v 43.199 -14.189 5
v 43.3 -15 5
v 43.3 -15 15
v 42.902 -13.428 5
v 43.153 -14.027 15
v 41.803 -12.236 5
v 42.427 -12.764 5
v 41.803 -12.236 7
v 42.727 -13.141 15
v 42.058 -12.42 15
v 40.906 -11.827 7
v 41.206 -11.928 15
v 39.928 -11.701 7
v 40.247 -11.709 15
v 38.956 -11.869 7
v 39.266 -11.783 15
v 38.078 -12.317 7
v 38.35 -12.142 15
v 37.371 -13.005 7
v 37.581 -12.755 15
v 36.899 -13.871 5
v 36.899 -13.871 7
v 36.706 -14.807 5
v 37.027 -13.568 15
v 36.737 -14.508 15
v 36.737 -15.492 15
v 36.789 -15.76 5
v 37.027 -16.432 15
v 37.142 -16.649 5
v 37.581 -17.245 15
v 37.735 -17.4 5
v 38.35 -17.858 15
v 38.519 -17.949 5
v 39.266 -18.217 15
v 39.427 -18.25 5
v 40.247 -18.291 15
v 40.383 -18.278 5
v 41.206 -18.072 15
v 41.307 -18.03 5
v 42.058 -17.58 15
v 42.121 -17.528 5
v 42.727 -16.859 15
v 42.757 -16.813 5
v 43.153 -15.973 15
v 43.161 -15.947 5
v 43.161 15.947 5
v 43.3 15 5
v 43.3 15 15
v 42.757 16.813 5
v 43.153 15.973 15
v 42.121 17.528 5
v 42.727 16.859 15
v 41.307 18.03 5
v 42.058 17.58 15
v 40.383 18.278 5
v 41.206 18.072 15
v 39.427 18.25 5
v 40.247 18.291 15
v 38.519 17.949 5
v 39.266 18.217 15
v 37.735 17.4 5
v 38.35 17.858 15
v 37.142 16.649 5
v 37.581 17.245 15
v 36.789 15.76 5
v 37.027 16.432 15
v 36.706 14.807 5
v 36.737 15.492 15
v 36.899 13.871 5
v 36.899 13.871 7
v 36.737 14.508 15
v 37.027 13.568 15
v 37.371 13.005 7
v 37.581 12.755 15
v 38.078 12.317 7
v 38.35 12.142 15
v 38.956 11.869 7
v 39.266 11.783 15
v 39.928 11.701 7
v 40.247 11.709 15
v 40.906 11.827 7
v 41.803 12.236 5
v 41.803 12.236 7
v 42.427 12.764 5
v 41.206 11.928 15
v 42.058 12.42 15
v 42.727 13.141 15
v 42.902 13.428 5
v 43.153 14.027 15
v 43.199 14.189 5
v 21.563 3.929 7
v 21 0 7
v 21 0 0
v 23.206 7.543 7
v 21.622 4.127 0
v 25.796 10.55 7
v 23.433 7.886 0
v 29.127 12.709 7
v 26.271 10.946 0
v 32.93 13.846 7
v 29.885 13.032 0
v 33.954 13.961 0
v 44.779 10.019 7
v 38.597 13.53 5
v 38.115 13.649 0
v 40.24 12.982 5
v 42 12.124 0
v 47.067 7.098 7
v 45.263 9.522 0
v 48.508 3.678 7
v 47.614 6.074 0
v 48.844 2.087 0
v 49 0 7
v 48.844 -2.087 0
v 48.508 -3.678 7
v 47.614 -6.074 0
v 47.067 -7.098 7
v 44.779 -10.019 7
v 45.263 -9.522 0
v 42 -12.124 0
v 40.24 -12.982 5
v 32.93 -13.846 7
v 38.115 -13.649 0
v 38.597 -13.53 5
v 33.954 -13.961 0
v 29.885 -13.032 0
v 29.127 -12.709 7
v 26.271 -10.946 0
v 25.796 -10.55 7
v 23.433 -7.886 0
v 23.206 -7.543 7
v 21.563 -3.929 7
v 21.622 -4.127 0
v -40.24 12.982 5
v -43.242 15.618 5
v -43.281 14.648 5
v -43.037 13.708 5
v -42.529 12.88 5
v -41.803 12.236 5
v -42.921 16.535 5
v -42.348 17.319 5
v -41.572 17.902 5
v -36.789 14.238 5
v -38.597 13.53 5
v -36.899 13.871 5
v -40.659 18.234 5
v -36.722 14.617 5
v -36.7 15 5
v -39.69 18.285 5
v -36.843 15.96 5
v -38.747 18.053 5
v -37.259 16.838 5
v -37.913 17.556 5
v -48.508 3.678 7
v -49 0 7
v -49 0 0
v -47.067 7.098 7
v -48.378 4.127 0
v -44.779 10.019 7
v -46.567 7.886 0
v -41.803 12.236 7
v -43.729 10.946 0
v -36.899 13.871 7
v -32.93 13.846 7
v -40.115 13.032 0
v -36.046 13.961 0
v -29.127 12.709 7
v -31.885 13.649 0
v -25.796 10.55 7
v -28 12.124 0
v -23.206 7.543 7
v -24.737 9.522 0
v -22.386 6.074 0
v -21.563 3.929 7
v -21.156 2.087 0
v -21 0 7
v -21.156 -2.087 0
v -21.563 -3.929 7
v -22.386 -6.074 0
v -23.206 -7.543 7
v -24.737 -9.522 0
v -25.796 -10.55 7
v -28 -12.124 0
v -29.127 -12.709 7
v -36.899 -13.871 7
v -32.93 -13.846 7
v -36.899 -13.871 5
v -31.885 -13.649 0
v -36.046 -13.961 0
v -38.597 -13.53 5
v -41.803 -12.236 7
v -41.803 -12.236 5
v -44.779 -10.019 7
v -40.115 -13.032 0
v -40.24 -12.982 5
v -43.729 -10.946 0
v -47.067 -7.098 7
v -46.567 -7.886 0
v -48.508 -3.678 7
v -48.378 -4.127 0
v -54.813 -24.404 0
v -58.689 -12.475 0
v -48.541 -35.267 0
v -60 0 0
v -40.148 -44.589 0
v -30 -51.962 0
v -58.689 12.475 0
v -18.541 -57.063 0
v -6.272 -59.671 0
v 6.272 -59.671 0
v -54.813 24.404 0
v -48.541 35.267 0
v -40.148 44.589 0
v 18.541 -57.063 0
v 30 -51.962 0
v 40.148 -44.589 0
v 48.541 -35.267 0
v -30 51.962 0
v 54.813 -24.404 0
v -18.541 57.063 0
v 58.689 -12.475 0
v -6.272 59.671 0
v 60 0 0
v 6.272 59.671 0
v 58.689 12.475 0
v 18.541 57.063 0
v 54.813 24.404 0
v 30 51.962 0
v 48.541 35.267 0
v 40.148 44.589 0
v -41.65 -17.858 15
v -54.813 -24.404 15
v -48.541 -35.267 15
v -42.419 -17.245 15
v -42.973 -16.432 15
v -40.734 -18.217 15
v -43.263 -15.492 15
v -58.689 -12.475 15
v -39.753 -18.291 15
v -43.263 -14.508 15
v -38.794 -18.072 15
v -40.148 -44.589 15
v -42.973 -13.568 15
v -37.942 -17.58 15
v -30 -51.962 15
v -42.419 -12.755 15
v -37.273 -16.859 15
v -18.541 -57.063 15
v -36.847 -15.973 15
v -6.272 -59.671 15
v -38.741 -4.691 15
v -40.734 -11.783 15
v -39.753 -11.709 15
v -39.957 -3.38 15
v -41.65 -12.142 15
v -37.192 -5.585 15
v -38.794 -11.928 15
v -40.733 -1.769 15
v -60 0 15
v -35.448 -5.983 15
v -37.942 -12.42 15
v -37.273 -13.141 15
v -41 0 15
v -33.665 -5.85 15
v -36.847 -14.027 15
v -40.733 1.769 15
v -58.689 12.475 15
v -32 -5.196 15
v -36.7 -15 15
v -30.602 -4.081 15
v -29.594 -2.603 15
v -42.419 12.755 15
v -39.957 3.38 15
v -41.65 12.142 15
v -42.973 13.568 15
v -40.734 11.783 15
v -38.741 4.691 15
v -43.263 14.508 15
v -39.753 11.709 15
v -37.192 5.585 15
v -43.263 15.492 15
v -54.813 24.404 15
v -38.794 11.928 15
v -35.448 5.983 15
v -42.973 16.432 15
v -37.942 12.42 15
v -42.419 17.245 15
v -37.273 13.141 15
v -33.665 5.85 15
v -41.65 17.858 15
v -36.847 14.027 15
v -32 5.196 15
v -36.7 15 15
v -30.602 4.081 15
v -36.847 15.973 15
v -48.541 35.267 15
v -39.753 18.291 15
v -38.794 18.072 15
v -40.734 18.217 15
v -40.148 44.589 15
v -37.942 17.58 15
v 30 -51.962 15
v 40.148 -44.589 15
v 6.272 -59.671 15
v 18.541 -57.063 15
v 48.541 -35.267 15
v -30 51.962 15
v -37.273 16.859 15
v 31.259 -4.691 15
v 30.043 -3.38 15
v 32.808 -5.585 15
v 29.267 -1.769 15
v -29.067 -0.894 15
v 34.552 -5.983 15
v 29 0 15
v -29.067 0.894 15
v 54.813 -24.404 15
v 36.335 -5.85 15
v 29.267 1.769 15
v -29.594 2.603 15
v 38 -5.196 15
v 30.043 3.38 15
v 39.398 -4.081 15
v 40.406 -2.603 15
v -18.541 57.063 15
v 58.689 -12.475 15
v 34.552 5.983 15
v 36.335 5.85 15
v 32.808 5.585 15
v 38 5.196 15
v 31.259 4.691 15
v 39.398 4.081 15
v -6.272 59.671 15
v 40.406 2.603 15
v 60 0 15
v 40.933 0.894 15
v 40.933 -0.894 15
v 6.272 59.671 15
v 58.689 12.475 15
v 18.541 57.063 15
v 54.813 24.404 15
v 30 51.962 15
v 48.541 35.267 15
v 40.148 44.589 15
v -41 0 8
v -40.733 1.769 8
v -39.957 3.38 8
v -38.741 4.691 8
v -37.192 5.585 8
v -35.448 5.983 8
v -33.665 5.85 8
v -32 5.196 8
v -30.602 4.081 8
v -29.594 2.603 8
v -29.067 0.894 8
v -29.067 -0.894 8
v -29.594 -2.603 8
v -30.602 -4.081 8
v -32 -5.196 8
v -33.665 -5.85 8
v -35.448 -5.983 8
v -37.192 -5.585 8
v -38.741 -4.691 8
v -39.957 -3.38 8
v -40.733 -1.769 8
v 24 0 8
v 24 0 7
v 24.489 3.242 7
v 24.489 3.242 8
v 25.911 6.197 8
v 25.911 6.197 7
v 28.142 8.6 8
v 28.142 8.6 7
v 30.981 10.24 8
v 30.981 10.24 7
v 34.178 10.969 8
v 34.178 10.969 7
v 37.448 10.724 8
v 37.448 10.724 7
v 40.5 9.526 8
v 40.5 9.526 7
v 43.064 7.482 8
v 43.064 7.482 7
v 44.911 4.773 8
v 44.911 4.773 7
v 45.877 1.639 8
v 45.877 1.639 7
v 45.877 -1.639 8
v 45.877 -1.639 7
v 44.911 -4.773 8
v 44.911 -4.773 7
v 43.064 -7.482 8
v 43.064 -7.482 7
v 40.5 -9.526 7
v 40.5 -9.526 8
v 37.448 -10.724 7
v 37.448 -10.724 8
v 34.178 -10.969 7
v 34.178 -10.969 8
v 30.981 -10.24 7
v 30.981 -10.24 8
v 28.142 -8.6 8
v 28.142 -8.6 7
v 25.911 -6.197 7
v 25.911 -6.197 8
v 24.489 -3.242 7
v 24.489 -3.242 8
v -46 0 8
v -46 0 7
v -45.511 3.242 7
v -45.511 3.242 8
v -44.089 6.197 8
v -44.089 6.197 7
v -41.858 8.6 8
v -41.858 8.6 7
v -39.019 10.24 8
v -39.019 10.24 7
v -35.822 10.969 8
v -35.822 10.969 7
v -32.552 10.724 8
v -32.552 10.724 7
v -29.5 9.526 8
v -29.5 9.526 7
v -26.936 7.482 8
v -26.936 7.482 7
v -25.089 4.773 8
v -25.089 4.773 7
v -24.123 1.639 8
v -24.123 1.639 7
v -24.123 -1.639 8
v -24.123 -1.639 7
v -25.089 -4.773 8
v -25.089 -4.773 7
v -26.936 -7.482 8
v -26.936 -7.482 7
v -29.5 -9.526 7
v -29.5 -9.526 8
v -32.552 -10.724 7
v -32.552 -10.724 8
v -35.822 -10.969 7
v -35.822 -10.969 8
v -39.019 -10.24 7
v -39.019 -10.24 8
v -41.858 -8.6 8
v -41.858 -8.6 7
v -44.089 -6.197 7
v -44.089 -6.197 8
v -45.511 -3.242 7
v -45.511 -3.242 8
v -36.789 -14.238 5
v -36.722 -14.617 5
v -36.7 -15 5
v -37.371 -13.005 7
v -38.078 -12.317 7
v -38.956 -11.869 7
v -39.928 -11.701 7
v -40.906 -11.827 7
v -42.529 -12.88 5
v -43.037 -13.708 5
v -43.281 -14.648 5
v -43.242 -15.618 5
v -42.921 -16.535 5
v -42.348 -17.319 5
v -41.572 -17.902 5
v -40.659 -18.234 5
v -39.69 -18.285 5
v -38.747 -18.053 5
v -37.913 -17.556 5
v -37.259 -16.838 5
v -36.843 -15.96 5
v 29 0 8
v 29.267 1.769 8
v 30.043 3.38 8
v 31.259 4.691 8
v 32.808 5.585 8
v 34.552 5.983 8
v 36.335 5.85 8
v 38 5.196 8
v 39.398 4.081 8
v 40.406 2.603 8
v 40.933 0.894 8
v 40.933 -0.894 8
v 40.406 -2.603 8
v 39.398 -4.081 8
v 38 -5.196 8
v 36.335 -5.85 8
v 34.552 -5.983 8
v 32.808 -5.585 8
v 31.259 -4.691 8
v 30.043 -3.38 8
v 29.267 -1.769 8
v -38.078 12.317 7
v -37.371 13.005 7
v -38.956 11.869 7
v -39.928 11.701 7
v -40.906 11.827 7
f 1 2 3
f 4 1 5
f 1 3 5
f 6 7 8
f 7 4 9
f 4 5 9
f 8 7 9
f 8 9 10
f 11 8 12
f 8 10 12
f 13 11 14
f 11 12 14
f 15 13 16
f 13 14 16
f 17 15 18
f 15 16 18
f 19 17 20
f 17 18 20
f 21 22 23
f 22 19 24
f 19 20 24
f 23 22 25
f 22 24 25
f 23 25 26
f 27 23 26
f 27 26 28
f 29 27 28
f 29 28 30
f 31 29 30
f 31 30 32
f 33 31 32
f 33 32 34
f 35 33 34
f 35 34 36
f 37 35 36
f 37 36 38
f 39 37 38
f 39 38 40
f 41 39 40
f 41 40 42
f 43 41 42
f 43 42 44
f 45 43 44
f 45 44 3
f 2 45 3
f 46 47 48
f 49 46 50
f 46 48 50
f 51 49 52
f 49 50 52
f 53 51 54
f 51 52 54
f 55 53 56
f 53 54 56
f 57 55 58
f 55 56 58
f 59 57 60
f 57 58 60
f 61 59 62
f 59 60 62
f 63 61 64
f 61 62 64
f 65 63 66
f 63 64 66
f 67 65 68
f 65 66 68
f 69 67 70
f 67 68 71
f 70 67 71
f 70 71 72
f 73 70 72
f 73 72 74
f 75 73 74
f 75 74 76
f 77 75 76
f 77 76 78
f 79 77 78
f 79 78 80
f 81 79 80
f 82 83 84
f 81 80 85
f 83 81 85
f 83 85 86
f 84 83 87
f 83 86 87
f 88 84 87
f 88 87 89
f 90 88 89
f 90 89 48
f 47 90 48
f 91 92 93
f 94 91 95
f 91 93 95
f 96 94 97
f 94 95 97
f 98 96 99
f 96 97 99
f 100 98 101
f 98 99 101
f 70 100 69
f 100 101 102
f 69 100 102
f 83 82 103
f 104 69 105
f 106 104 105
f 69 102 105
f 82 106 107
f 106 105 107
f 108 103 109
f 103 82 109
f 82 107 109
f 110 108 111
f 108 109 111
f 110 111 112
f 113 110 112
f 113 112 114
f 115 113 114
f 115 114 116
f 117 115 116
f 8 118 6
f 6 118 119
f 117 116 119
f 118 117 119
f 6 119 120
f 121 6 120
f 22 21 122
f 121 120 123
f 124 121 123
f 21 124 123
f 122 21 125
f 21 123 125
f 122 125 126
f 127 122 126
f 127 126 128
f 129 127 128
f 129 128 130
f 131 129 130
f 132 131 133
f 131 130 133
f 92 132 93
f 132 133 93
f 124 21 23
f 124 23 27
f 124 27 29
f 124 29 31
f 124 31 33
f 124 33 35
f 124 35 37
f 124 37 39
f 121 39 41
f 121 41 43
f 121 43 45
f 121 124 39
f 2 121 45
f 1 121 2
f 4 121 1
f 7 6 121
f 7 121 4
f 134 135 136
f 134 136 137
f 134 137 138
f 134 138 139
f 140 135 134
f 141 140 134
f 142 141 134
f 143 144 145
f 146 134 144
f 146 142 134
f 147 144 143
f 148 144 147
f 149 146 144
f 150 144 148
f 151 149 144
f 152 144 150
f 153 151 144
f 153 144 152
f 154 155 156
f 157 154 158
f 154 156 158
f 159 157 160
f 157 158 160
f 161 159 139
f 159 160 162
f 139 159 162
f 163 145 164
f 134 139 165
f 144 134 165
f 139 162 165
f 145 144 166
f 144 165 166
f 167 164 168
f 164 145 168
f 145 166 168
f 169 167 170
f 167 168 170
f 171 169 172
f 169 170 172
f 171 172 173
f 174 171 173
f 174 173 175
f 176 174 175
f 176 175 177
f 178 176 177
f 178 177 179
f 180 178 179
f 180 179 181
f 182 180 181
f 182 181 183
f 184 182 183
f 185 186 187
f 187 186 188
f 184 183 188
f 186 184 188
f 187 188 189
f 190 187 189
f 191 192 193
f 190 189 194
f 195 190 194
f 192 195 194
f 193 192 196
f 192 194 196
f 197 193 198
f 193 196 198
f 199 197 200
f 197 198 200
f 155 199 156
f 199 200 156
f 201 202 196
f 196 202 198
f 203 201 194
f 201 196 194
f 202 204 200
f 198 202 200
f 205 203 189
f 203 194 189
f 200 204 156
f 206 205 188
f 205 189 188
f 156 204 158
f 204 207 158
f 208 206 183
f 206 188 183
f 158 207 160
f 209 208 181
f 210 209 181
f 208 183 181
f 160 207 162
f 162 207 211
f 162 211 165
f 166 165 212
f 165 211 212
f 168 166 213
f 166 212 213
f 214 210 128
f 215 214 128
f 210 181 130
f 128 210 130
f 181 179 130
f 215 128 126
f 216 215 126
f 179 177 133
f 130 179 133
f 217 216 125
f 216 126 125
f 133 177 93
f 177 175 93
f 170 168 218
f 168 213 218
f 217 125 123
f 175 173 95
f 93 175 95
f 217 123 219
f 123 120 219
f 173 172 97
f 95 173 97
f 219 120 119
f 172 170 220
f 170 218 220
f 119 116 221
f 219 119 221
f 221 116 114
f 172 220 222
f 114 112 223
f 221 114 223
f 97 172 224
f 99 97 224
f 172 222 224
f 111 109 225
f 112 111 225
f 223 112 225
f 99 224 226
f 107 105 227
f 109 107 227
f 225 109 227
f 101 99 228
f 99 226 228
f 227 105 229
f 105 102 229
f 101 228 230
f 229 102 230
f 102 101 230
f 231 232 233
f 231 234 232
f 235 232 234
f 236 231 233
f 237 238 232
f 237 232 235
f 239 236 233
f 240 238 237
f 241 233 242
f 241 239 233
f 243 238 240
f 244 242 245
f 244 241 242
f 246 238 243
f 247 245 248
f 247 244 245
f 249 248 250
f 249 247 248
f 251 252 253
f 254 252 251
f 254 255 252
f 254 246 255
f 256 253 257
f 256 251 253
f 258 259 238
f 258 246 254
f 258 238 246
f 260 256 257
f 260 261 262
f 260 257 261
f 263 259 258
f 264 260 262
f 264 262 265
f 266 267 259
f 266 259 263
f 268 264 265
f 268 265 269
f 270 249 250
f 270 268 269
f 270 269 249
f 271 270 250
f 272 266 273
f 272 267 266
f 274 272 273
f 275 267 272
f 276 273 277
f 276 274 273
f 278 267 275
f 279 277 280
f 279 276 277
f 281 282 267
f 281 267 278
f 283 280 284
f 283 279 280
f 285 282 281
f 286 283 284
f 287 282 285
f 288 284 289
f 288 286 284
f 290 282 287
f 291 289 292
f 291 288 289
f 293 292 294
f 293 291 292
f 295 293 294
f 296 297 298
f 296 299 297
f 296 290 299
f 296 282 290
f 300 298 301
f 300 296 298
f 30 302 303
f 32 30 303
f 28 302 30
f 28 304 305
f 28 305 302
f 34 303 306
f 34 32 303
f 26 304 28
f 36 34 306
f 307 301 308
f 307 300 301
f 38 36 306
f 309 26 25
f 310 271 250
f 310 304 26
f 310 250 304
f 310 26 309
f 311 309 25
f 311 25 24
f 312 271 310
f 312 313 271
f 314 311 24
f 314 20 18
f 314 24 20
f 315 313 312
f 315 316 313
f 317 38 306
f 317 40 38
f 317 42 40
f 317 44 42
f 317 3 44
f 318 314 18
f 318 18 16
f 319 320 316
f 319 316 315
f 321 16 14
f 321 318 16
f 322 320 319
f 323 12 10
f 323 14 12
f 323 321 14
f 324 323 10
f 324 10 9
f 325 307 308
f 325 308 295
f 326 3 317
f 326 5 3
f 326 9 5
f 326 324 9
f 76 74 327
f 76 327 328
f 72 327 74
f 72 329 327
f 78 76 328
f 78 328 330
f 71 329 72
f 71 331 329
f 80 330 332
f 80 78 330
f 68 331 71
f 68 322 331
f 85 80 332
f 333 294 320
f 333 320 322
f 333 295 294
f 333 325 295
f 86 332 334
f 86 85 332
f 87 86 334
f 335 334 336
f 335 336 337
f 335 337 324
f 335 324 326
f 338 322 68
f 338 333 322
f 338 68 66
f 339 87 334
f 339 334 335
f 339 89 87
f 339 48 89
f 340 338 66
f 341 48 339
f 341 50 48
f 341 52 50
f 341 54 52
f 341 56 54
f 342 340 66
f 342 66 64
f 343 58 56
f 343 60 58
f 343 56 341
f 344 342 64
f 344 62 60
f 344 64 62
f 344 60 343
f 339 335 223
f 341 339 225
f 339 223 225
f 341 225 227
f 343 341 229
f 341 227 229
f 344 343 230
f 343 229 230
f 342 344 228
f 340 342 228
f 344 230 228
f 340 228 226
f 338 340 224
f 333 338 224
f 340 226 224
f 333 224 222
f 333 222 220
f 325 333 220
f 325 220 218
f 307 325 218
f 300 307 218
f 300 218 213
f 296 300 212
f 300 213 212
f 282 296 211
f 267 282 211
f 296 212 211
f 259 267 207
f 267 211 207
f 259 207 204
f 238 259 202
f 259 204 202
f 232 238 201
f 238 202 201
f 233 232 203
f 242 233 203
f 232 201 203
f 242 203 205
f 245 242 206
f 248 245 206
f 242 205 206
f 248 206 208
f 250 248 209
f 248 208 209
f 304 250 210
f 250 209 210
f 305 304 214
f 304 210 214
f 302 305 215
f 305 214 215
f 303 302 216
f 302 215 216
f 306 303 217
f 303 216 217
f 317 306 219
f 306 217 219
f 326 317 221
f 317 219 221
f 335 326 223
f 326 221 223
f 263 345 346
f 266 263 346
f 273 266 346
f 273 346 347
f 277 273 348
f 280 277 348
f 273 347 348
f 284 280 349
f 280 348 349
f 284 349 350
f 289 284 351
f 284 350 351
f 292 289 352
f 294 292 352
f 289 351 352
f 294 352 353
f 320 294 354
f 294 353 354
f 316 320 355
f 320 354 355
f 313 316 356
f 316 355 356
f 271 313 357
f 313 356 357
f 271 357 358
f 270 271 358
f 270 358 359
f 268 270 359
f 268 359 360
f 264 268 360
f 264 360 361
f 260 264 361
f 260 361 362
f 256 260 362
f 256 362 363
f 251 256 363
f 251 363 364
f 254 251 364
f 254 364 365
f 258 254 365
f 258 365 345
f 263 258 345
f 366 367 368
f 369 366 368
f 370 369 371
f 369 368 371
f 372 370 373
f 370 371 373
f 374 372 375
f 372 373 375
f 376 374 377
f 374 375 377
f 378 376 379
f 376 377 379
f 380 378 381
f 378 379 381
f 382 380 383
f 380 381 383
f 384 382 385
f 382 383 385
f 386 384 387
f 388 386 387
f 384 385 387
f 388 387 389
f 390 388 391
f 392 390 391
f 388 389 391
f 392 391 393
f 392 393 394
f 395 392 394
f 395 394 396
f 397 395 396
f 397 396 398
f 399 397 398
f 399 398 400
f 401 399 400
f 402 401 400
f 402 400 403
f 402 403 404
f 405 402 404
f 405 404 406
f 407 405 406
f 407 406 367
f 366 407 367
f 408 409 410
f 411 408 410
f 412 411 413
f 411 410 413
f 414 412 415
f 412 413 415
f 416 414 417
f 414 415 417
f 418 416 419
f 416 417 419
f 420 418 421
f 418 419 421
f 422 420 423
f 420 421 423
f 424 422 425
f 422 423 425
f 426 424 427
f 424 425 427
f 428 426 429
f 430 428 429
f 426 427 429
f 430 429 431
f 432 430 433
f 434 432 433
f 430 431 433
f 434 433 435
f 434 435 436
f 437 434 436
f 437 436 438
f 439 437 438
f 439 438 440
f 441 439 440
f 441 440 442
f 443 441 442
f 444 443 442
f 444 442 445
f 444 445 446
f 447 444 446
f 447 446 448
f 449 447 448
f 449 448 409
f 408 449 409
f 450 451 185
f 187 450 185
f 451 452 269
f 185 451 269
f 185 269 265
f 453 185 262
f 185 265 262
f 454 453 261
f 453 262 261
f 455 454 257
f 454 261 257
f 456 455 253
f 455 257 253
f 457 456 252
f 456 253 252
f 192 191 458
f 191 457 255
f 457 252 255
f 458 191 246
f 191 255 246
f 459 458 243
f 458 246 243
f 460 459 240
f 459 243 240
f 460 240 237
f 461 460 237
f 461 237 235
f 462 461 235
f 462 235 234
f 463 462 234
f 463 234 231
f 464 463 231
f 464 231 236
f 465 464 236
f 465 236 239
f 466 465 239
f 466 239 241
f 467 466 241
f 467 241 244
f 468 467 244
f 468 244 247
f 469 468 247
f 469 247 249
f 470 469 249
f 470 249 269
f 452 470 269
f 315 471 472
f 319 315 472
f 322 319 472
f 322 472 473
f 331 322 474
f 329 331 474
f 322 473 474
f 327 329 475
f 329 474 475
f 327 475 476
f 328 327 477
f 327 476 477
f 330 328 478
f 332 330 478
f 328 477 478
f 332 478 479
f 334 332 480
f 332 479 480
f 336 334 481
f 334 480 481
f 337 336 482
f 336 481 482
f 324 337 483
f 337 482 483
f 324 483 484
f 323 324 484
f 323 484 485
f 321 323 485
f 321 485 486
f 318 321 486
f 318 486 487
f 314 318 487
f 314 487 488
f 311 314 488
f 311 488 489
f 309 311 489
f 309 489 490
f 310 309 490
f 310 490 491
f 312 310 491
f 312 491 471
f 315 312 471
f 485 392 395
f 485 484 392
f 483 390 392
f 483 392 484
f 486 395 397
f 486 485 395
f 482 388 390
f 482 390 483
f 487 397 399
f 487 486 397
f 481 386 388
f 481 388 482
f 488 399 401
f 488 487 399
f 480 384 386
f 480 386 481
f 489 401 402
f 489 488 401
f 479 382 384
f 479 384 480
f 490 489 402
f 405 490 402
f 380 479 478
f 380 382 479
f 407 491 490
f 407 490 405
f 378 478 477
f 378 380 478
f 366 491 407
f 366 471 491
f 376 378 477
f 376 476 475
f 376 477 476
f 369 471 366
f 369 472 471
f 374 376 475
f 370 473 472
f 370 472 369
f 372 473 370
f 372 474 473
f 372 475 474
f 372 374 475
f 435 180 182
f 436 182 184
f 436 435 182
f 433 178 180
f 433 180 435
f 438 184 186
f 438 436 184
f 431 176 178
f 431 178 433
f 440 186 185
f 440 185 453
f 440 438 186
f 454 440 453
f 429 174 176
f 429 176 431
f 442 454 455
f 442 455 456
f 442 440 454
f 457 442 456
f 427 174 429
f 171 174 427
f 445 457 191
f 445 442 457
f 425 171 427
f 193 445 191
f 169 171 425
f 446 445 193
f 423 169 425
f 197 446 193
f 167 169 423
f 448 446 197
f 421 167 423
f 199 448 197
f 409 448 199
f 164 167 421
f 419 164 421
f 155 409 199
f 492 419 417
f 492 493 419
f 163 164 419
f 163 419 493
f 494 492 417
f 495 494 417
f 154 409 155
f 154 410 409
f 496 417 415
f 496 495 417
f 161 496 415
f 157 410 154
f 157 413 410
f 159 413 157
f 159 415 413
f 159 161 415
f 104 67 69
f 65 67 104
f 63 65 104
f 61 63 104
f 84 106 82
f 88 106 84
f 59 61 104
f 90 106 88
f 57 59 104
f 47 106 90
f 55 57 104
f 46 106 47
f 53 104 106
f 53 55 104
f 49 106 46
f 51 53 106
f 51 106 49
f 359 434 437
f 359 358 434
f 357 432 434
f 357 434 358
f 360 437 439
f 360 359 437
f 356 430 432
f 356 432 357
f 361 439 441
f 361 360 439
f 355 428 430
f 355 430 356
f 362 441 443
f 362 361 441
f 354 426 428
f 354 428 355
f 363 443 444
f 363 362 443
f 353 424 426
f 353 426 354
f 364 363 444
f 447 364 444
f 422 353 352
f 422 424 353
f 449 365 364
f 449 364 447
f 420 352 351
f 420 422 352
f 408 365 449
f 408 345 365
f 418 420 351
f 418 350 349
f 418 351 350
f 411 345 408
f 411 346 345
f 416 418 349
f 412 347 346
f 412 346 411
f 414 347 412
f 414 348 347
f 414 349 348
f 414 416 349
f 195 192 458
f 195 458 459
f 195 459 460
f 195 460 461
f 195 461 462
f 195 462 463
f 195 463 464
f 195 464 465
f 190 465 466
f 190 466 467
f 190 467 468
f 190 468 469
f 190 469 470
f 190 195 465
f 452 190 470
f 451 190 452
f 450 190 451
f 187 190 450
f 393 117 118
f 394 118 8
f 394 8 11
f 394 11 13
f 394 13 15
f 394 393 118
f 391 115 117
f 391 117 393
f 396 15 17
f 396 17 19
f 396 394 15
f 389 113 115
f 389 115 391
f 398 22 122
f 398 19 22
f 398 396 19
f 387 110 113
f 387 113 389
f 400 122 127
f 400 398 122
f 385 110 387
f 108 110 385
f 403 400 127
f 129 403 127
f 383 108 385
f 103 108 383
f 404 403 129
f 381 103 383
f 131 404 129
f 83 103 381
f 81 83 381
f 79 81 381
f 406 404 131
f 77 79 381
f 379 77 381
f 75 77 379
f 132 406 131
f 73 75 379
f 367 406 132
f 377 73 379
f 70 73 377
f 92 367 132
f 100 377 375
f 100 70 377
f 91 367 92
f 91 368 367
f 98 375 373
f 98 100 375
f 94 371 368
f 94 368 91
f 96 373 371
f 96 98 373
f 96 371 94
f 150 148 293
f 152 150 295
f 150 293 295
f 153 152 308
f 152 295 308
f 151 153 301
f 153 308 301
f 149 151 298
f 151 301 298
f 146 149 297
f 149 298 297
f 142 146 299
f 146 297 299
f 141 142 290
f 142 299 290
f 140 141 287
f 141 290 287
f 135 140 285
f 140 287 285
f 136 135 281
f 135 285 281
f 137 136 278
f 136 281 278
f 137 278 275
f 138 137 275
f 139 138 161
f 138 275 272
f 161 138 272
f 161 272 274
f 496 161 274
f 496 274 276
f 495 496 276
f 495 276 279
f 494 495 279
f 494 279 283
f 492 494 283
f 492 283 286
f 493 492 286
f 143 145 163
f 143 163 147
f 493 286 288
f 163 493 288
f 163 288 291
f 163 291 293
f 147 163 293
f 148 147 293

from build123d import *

# Parameters (mm, degrees)
SKETCH_1_R          = 60
EXTRUDE_1_DEPTH     = 15
SKETCH_2_R          = 6
CUT_EXTRUDE_1_DEPTH = 87.168439698
SKETCH_3_R          = 11
CUT_EXTRUDE_2_DEPTH = 8
SKETCH_5_R          = 3.3
CUT_EXTRUDE_4_DEPTH = 10
SKETCH_6_R          = 14
CUT_EXTRUDE_5_DEPTH = 7


with BuildPart() as part:
    # 草图1 → 凸台-拉伸1 (new body)
    with BuildSketch(Plane.XY):
        Circle(SKETCH_1_R)
    extrude(amount=EXTRUDE_1_DEPTH)

    # 草图2 → 切除-拉伸1 (cut, through all)
    with BuildSketch(Plane(origin=(0, 0, 0), x_dir=(-1, 0, 0), z_dir=(0, 0, -1))):
        with Locations((-35, 0)):
            Circle(SKETCH_2_R)
        with Locations((35, 0)):
            Circle(SKETCH_2_R)
    extrude(amount=-CUT_EXTRUDE_1_DEPTH, mode=Mode.SUBTRACT)

    # 草图3 → 切除-拉伸2 (cut)
    with BuildSketch(Plane(origin=(0, 0, 0), x_dir=(-1, 0, 0), z_dir=(0, 0, -1))):
        with Locations((35, 0)):
            Circle(SKETCH_3_R)
        with Locations((-35, 0)):
            Circle(SKETCH_3_R)
    extrude(amount=-CUT_EXTRUDE_2_DEPTH, mode=Mode.SUBTRACT)

    # 草图5 → 切除-拉伸4 (cut)
    with BuildSketch(Plane.XY.offset(15)):
        with Locations((40, 15)):
            Circle(SKETCH_5_R)
        with Locations((40, -15)):
            Circle(SKETCH_5_R)
        with Locations((-40, -15)):
            Circle(SKETCH_5_R)
        with Locations((-40, 15)):
            Circle(SKETCH_5_R)
    extrude(amount=-CUT_EXTRUDE_4_DEPTH, mode=Mode.SUBTRACT)

    # 草图6 → 切除-拉伸5 (cut)
    with BuildSketch(Plane(origin=(0, 0, 0), x_dir=(-1, 0, 0), z_dir=(0, 0, -1))):
        with Locations((35, 0)):
            Circle(SKETCH_6_R)
        with Locations((-35, 0)):
            Circle(SKETCH_6_R)
    extrude(amount=-CUT_EXTRUDE_5_DEPTH, mode=Mode.SUBTRACT)


solid = part.part
